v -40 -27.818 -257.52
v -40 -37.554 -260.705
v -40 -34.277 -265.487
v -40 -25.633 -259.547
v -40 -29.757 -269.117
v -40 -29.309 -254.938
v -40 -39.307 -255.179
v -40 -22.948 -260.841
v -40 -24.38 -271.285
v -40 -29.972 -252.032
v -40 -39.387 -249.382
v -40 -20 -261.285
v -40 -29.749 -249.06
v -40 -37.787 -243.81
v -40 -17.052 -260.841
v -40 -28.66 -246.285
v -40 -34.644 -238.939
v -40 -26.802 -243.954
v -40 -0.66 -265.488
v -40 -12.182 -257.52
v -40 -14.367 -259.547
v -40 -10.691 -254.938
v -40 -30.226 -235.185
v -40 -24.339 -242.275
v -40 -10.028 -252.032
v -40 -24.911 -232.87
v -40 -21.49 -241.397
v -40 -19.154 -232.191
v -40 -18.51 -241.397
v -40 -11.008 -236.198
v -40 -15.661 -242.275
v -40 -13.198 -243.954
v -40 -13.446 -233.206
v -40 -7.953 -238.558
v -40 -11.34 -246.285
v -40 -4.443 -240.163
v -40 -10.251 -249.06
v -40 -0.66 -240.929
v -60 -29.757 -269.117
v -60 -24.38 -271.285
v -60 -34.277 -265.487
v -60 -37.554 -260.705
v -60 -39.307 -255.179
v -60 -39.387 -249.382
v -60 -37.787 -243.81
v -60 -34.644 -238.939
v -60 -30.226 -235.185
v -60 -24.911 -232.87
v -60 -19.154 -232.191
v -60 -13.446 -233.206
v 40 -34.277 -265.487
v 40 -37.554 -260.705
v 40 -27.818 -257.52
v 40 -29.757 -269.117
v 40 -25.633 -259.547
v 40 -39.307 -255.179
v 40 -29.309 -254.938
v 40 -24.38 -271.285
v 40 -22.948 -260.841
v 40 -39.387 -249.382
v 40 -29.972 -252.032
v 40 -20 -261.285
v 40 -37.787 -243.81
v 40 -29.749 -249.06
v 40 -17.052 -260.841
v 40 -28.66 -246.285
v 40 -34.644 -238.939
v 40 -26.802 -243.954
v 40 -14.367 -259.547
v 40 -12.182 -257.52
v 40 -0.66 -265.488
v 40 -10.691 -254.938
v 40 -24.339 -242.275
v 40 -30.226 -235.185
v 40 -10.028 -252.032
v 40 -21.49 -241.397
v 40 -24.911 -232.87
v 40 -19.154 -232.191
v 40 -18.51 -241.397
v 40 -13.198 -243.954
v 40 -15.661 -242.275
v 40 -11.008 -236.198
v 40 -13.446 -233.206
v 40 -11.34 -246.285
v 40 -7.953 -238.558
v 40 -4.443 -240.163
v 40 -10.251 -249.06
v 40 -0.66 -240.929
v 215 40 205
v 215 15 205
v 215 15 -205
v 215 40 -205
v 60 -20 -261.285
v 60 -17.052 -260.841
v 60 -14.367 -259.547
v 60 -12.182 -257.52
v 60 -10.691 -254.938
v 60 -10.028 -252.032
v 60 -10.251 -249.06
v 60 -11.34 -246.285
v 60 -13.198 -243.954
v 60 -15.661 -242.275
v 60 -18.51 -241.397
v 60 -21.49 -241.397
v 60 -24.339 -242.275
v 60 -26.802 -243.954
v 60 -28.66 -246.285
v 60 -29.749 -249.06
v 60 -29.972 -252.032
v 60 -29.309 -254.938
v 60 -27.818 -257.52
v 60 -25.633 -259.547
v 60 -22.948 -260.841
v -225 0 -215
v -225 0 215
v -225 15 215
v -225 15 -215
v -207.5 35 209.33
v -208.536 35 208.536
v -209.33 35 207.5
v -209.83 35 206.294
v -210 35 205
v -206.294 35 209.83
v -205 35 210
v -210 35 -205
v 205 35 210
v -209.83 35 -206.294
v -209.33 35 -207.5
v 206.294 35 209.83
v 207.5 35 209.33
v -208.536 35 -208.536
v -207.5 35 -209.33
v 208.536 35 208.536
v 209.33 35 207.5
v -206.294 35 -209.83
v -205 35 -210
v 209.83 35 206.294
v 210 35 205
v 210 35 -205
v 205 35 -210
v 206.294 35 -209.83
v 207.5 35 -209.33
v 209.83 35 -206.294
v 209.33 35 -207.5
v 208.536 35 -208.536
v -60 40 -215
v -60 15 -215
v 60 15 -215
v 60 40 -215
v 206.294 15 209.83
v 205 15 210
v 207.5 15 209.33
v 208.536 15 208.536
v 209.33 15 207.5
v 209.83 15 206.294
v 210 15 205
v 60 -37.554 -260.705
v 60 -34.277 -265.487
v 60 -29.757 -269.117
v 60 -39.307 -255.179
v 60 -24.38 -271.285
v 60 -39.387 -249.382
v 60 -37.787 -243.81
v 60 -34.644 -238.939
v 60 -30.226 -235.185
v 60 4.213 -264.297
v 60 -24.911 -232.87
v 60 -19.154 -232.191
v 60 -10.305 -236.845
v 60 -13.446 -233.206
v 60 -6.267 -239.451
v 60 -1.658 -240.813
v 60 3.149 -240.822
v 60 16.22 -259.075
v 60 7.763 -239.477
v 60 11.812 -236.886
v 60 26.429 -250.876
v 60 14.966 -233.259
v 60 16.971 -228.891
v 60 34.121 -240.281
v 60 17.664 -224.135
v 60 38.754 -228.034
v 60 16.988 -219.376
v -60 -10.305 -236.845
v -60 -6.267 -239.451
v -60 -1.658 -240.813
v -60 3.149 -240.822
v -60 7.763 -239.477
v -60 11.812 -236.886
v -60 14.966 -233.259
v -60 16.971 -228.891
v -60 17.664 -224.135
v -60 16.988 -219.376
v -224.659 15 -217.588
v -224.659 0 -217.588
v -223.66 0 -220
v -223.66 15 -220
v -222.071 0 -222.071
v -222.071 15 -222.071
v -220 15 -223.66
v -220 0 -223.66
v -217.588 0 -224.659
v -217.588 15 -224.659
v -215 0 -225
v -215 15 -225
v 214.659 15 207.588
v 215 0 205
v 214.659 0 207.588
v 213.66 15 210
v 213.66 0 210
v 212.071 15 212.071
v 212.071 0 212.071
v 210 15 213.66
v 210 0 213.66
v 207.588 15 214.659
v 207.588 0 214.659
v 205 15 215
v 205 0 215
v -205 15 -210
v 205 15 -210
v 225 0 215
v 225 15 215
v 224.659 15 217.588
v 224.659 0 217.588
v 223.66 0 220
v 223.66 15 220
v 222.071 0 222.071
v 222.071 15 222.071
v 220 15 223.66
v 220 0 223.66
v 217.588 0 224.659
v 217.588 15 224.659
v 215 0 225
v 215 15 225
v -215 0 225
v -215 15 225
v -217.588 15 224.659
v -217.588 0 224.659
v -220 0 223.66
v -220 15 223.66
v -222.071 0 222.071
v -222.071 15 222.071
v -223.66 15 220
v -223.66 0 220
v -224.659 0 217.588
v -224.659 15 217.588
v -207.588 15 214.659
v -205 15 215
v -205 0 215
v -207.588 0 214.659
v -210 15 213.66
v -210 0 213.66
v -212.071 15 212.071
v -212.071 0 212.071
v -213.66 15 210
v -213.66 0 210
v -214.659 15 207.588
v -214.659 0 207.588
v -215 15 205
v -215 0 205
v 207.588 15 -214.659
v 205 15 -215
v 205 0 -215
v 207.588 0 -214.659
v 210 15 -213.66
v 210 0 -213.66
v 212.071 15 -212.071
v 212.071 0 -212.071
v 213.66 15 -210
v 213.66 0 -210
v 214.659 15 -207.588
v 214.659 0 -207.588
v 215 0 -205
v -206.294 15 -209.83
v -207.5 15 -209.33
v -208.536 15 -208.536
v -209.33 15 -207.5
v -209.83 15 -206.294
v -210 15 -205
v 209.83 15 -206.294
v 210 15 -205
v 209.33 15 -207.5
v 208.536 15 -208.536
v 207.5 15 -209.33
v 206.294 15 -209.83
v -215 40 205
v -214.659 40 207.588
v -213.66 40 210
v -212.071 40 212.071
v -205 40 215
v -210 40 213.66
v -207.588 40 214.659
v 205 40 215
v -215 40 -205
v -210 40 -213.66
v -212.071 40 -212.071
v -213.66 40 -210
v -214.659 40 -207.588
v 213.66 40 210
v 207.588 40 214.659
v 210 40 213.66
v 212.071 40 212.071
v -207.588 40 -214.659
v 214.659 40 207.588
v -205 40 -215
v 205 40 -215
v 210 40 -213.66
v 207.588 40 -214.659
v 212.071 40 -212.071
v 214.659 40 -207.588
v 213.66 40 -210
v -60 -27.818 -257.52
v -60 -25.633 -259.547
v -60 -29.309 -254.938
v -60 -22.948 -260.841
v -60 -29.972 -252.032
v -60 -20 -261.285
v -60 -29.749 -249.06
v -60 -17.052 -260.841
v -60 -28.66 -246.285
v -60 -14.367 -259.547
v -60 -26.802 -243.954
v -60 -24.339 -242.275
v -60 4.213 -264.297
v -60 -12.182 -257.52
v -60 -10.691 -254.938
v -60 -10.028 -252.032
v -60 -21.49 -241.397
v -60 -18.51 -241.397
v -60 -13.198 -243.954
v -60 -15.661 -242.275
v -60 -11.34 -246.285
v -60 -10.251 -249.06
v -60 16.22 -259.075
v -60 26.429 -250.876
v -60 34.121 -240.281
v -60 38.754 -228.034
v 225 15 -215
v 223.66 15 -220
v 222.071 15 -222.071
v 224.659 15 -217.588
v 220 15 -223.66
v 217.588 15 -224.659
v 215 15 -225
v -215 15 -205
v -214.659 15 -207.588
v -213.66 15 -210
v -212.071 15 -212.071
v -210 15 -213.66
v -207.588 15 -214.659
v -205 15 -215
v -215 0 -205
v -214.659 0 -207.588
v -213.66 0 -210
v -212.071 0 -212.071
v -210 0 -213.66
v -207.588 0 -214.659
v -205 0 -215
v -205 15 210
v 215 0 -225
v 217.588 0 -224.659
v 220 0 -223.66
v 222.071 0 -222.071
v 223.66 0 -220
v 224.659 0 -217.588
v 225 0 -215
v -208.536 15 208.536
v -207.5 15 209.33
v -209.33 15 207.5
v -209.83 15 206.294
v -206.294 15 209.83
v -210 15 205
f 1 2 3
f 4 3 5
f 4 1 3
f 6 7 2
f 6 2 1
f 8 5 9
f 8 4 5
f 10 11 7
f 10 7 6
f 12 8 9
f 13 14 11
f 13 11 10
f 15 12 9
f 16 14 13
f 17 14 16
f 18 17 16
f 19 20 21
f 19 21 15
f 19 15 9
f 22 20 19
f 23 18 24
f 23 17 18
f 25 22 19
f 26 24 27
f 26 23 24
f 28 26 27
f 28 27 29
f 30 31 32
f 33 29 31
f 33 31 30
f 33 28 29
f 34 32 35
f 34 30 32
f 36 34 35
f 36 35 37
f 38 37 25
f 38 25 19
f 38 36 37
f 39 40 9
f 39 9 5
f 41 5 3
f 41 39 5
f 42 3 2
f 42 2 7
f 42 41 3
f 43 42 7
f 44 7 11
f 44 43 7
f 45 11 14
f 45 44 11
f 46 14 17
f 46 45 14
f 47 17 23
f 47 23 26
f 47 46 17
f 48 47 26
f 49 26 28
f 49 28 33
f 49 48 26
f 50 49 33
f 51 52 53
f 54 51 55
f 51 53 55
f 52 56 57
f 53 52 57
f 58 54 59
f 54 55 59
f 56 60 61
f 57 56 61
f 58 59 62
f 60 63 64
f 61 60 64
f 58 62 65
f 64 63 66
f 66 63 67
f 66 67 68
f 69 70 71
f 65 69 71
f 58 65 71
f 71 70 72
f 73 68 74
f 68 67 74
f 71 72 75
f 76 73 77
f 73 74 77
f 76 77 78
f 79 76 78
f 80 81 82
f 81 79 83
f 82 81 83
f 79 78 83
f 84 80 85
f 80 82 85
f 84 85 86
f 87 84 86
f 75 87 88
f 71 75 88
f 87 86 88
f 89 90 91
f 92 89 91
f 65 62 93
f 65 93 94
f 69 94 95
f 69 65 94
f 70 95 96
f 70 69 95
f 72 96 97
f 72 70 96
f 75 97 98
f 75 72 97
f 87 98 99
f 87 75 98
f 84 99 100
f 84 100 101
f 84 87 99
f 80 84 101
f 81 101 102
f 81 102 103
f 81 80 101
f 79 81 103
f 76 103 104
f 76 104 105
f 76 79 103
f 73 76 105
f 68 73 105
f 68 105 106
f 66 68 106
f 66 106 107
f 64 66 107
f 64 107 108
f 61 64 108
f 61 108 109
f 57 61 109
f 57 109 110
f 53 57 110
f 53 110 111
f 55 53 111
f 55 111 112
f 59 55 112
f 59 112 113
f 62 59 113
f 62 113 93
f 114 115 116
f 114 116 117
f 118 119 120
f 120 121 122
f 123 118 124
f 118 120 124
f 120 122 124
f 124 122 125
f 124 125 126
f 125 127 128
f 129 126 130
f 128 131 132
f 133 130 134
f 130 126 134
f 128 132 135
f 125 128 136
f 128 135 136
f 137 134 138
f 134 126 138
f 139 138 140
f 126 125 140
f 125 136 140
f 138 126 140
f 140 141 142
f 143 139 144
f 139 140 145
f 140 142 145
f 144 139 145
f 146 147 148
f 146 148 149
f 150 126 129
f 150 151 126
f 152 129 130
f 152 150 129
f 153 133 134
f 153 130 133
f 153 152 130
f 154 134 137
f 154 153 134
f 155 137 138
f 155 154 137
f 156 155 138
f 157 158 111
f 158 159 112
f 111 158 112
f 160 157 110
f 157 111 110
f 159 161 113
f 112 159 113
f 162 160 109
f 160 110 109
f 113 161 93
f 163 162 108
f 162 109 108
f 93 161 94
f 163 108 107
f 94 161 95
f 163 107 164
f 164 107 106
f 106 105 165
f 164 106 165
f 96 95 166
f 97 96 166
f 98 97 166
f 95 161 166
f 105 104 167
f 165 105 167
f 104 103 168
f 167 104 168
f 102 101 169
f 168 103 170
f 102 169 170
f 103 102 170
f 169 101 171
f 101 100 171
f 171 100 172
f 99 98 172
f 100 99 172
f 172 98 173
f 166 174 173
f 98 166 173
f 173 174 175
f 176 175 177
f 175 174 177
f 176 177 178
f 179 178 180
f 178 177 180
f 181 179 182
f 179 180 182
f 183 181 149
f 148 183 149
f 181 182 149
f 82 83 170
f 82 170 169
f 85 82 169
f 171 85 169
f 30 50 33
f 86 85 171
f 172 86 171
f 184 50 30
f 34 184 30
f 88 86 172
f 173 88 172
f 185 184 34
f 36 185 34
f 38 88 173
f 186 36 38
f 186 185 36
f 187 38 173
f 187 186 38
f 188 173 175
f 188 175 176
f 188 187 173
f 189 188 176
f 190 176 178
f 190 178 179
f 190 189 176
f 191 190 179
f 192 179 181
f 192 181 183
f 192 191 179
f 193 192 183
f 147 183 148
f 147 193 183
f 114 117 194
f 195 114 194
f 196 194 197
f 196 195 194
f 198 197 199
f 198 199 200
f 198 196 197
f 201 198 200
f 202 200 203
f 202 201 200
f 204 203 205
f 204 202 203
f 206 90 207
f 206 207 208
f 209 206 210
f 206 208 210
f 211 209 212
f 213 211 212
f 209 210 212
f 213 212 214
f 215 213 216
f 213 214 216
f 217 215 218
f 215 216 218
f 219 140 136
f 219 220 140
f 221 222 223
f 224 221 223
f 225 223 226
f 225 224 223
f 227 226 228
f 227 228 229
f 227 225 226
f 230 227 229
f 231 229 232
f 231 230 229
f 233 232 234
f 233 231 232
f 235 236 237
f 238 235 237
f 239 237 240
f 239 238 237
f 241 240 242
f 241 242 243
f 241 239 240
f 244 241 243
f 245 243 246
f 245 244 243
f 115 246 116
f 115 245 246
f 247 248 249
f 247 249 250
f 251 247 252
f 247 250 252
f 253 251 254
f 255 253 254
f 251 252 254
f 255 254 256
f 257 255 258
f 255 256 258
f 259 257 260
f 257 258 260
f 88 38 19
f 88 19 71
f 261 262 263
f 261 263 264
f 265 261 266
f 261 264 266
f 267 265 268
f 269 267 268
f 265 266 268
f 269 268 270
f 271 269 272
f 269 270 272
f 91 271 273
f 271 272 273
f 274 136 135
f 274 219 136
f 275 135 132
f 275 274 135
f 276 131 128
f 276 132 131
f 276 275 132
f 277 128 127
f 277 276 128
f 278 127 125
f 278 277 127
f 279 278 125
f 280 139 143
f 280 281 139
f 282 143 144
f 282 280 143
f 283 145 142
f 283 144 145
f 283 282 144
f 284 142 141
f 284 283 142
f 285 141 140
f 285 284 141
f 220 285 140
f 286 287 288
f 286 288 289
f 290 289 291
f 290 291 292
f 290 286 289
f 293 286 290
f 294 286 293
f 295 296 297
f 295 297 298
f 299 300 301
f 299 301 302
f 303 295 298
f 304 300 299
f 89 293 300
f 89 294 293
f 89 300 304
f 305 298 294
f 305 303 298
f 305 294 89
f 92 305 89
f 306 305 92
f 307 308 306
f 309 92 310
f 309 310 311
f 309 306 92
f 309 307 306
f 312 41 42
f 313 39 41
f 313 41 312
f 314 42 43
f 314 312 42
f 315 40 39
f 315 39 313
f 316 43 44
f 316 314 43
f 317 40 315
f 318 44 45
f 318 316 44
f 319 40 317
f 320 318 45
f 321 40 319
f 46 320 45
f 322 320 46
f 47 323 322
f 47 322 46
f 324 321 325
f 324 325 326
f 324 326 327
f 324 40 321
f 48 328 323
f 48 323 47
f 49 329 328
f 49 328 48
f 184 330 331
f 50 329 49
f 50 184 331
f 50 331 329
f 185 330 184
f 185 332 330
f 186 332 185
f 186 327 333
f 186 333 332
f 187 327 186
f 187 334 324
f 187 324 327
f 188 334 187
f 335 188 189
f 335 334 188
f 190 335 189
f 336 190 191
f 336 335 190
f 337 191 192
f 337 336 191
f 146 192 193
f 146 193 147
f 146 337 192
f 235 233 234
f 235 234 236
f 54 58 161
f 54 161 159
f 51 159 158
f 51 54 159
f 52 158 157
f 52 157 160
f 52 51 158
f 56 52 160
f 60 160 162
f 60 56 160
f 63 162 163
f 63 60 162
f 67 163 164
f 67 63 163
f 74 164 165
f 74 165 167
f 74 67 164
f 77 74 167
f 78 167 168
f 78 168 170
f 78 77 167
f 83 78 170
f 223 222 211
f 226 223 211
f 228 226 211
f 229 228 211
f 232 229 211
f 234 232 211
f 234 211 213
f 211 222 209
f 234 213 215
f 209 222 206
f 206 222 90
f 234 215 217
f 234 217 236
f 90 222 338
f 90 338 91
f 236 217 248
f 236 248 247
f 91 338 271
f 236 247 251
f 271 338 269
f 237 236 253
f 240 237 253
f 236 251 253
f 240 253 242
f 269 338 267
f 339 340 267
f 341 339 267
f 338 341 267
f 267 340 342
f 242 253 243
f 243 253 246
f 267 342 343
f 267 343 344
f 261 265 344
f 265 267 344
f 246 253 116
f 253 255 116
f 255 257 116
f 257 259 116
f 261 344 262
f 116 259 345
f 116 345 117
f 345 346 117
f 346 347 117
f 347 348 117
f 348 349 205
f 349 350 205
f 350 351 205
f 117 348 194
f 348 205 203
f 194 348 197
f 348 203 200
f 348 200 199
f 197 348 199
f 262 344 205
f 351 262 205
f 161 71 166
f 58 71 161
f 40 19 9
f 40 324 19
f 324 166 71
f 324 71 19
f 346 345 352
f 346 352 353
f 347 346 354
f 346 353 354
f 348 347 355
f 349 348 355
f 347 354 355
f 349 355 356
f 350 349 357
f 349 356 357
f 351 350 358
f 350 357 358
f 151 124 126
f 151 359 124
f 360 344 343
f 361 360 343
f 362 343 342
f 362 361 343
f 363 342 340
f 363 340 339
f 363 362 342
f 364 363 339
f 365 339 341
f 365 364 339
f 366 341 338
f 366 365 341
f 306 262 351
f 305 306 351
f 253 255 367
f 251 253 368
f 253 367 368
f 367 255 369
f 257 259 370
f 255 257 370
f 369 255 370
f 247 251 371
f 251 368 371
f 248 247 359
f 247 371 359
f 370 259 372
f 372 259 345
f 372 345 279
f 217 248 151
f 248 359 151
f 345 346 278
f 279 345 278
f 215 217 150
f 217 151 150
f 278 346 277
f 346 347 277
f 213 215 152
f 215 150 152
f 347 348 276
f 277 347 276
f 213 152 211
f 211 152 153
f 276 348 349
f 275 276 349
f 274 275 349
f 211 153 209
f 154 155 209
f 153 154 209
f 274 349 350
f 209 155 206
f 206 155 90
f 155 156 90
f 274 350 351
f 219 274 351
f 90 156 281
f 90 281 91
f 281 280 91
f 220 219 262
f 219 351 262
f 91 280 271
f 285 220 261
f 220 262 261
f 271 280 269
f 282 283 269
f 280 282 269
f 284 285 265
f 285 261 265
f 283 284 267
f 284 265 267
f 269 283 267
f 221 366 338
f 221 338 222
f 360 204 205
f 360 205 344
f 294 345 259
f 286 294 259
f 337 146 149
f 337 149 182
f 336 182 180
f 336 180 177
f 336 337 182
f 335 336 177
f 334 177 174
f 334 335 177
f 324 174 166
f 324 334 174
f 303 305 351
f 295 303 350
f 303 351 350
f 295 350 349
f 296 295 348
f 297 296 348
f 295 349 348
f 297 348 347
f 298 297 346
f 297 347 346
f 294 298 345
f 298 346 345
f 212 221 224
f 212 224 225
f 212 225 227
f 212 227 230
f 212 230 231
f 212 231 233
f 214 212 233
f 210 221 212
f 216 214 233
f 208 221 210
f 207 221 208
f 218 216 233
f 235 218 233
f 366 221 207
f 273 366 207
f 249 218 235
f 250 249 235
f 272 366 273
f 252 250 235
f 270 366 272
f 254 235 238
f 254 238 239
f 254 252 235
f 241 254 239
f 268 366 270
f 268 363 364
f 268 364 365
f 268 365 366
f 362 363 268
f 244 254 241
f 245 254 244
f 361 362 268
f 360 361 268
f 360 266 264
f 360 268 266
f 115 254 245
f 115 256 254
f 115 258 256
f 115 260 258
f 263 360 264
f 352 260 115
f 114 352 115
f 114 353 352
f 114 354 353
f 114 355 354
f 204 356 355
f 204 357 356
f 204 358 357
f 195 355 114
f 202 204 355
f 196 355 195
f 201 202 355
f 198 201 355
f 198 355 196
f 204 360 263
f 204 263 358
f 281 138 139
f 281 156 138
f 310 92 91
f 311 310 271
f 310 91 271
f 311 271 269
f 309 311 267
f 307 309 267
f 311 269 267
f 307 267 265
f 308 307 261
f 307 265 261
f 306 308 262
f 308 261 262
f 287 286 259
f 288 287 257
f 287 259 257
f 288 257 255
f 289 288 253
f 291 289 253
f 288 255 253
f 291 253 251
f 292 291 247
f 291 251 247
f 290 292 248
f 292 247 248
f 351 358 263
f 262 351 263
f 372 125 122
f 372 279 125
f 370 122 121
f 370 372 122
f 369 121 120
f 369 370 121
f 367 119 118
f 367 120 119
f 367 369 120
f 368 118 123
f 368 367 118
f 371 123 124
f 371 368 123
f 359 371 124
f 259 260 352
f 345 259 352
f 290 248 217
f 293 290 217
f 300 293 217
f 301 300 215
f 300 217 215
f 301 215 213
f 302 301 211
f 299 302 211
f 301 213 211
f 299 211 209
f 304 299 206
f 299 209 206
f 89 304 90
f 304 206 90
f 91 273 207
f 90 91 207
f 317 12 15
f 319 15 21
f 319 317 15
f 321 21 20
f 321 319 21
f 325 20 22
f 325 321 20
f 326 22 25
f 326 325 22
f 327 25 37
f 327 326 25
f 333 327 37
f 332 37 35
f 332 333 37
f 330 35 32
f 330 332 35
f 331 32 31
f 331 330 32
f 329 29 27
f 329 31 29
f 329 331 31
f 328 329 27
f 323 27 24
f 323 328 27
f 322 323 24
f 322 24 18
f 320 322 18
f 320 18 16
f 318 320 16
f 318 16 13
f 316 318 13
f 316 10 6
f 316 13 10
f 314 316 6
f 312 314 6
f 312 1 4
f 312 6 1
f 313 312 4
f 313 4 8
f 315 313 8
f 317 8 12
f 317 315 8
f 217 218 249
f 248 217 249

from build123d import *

# Parameters (mm, degrees)
BOSS_EXTRUDE1_DEPTH      = 15
BOSS_EXTRUDE2_DEPTH      = 25
SHELL1_T                 = -5
BOSS_EXTRUDE9_DEPTH      = 60
BOSS_EXTRUDE9_DEPTH_BACK = 60
SKETCH3_R                = 10
SKETCH4_W                = 80
SKETCH4_H                = 45.141945931
CUT_EXTRUDE2_DEPTH       = 377


with BuildPart() as part:
    # Sketch1 → Boss-Extrude1 (new body)
    with BuildSketch(Plane(origin=(0, 0, 0), x_dir=(1, 0, 0), z_dir=(0, 1, 0))):
        with BuildLine():
            Line((-215, 225), (215, 225))
            ThreePointArc((215, 225), (222.071067812, 222.071067812), (225, 215))
            Line((225, 215), (225, -215))
            ThreePointArc((225, -215), (222.071067812, -222.071067812), (215, -225))
            Line((215, -225), (-215, -225))
            ThreePointArc((-215, -225), (-222.071067812, -222.071067812), (-225, -215))
            Line((-225, -215), (-225, 215))
            ThreePointArc((-225, 215), (-222.071067812, 222.071067812), (-215, 225))
        make_face()
        with BuildLine():
            Line((-205, 215), (205, 215))
            ThreePointArc((205, 215), (212.071067812, 212.071067812), (215, 205))
            Line((215, 205), (215, -205))
            ThreePointArc((215, -205), (212.071067812, -212.071067812), (205, -215))
            Line((205, -215), (-205, -215))
            ThreePointArc((-205, -215), (-212.071067812, -212.071067812), (-215, -205))
            Line((-215, -205), (-215, 205))
            ThreePointArc((-215, 205), (-212.071067812, 212.071067812), (-205, 215))
        make_face(mode=Mode.SUBTRACT)
    extrude(amount=BOSS_EXTRUDE1_DEPTH)


with BuildPart() as body_2:
    # Sketch2 → Boss-Extrude2 (new body)
    with BuildSketch(Plane(origin=(0, 15, 0), x_dir=(1, 0, 0), z_dir=(0, 1, 0))):
        with BuildLine():
            Line((-205, -215), (205, -215))
            ThreePointArc((205, -215), (212.071067812, -212.071067812), (215, -205))
            Line((215, -205), (215, 205))
            ThreePointArc((215, 205), (212.071067812, 212.071067812), (205, 215))
            Line((205, 215), (-205, 215))
            ThreePointArc((-205, 215), (-212.071067812, 212.071067812), (-215, 205))
            Line((-215, 205), (-215, -205))
            ThreePointArc((-215, -205), (-212.071067812, -212.071067812), (-205, -215))
        make_face()
    extrude(amount=BOSS_EXTRUDE2_DEPTH)

    # Shell1
    shell1_openings = [body_2.faces().sort_by_distance(p)[0] for p in [
        (0, 15, 0),
    ]]
    offset(amount=SHELL1_T, openings=shell1_openings, kind=Kind.INTERSECTION)


with BuildPart() as body_3:
    # Sketch3 → Boss-Extrude9 (new, two sides: drawn at the far end of the back side and taken through both)
    with BuildSketch(Plane(origin=(0, 0, 0), x_dir=(0, 0, -1), z_dir=(1, 0, 0)).offset(-BOSS_EXTRUDE9_DEPTH_BACK)):
        with BuildLine():
            Line((264.296973896, 4.212622215), (271.284873642, -24.379992565))
            ThreePointArc((271.284873642, -24.379992565), (246.537479386, -38.792109825), (233.206154552, -13.4461353))
            ThreePointArc((233.206154552, -13.4461353), (238.326144926, 9.880009626), (215, 15))
            Line((215, 15), (215, 40))
            ThreePointArc((215, 40), (245.834951571, 30.628142096), (264.296973896, 4.212622215))
        make_face()
        with Locations((251.284873642, -20)):
            Circle(SKETCH3_R, mode=Mode.SUBTRACT)
    extrude(amount=BOSS_EXTRUDE9_DEPTH + BOSS_EXTRUDE9_DEPTH_BACK)

    # Sketch4 → Cut-Extrude2 (cut)
    with BuildSketch(Plane.XY):
        with Locations((0, -23.230591545)):
            Rectangle(SKETCH4_W, SKETCH4_H)
    extrude(amount=-CUT_EXTRUDE2_DEPTH, mode=Mode.SUBTRACT)


solid = Compound([part.part, body_2.part, body_3.part])
